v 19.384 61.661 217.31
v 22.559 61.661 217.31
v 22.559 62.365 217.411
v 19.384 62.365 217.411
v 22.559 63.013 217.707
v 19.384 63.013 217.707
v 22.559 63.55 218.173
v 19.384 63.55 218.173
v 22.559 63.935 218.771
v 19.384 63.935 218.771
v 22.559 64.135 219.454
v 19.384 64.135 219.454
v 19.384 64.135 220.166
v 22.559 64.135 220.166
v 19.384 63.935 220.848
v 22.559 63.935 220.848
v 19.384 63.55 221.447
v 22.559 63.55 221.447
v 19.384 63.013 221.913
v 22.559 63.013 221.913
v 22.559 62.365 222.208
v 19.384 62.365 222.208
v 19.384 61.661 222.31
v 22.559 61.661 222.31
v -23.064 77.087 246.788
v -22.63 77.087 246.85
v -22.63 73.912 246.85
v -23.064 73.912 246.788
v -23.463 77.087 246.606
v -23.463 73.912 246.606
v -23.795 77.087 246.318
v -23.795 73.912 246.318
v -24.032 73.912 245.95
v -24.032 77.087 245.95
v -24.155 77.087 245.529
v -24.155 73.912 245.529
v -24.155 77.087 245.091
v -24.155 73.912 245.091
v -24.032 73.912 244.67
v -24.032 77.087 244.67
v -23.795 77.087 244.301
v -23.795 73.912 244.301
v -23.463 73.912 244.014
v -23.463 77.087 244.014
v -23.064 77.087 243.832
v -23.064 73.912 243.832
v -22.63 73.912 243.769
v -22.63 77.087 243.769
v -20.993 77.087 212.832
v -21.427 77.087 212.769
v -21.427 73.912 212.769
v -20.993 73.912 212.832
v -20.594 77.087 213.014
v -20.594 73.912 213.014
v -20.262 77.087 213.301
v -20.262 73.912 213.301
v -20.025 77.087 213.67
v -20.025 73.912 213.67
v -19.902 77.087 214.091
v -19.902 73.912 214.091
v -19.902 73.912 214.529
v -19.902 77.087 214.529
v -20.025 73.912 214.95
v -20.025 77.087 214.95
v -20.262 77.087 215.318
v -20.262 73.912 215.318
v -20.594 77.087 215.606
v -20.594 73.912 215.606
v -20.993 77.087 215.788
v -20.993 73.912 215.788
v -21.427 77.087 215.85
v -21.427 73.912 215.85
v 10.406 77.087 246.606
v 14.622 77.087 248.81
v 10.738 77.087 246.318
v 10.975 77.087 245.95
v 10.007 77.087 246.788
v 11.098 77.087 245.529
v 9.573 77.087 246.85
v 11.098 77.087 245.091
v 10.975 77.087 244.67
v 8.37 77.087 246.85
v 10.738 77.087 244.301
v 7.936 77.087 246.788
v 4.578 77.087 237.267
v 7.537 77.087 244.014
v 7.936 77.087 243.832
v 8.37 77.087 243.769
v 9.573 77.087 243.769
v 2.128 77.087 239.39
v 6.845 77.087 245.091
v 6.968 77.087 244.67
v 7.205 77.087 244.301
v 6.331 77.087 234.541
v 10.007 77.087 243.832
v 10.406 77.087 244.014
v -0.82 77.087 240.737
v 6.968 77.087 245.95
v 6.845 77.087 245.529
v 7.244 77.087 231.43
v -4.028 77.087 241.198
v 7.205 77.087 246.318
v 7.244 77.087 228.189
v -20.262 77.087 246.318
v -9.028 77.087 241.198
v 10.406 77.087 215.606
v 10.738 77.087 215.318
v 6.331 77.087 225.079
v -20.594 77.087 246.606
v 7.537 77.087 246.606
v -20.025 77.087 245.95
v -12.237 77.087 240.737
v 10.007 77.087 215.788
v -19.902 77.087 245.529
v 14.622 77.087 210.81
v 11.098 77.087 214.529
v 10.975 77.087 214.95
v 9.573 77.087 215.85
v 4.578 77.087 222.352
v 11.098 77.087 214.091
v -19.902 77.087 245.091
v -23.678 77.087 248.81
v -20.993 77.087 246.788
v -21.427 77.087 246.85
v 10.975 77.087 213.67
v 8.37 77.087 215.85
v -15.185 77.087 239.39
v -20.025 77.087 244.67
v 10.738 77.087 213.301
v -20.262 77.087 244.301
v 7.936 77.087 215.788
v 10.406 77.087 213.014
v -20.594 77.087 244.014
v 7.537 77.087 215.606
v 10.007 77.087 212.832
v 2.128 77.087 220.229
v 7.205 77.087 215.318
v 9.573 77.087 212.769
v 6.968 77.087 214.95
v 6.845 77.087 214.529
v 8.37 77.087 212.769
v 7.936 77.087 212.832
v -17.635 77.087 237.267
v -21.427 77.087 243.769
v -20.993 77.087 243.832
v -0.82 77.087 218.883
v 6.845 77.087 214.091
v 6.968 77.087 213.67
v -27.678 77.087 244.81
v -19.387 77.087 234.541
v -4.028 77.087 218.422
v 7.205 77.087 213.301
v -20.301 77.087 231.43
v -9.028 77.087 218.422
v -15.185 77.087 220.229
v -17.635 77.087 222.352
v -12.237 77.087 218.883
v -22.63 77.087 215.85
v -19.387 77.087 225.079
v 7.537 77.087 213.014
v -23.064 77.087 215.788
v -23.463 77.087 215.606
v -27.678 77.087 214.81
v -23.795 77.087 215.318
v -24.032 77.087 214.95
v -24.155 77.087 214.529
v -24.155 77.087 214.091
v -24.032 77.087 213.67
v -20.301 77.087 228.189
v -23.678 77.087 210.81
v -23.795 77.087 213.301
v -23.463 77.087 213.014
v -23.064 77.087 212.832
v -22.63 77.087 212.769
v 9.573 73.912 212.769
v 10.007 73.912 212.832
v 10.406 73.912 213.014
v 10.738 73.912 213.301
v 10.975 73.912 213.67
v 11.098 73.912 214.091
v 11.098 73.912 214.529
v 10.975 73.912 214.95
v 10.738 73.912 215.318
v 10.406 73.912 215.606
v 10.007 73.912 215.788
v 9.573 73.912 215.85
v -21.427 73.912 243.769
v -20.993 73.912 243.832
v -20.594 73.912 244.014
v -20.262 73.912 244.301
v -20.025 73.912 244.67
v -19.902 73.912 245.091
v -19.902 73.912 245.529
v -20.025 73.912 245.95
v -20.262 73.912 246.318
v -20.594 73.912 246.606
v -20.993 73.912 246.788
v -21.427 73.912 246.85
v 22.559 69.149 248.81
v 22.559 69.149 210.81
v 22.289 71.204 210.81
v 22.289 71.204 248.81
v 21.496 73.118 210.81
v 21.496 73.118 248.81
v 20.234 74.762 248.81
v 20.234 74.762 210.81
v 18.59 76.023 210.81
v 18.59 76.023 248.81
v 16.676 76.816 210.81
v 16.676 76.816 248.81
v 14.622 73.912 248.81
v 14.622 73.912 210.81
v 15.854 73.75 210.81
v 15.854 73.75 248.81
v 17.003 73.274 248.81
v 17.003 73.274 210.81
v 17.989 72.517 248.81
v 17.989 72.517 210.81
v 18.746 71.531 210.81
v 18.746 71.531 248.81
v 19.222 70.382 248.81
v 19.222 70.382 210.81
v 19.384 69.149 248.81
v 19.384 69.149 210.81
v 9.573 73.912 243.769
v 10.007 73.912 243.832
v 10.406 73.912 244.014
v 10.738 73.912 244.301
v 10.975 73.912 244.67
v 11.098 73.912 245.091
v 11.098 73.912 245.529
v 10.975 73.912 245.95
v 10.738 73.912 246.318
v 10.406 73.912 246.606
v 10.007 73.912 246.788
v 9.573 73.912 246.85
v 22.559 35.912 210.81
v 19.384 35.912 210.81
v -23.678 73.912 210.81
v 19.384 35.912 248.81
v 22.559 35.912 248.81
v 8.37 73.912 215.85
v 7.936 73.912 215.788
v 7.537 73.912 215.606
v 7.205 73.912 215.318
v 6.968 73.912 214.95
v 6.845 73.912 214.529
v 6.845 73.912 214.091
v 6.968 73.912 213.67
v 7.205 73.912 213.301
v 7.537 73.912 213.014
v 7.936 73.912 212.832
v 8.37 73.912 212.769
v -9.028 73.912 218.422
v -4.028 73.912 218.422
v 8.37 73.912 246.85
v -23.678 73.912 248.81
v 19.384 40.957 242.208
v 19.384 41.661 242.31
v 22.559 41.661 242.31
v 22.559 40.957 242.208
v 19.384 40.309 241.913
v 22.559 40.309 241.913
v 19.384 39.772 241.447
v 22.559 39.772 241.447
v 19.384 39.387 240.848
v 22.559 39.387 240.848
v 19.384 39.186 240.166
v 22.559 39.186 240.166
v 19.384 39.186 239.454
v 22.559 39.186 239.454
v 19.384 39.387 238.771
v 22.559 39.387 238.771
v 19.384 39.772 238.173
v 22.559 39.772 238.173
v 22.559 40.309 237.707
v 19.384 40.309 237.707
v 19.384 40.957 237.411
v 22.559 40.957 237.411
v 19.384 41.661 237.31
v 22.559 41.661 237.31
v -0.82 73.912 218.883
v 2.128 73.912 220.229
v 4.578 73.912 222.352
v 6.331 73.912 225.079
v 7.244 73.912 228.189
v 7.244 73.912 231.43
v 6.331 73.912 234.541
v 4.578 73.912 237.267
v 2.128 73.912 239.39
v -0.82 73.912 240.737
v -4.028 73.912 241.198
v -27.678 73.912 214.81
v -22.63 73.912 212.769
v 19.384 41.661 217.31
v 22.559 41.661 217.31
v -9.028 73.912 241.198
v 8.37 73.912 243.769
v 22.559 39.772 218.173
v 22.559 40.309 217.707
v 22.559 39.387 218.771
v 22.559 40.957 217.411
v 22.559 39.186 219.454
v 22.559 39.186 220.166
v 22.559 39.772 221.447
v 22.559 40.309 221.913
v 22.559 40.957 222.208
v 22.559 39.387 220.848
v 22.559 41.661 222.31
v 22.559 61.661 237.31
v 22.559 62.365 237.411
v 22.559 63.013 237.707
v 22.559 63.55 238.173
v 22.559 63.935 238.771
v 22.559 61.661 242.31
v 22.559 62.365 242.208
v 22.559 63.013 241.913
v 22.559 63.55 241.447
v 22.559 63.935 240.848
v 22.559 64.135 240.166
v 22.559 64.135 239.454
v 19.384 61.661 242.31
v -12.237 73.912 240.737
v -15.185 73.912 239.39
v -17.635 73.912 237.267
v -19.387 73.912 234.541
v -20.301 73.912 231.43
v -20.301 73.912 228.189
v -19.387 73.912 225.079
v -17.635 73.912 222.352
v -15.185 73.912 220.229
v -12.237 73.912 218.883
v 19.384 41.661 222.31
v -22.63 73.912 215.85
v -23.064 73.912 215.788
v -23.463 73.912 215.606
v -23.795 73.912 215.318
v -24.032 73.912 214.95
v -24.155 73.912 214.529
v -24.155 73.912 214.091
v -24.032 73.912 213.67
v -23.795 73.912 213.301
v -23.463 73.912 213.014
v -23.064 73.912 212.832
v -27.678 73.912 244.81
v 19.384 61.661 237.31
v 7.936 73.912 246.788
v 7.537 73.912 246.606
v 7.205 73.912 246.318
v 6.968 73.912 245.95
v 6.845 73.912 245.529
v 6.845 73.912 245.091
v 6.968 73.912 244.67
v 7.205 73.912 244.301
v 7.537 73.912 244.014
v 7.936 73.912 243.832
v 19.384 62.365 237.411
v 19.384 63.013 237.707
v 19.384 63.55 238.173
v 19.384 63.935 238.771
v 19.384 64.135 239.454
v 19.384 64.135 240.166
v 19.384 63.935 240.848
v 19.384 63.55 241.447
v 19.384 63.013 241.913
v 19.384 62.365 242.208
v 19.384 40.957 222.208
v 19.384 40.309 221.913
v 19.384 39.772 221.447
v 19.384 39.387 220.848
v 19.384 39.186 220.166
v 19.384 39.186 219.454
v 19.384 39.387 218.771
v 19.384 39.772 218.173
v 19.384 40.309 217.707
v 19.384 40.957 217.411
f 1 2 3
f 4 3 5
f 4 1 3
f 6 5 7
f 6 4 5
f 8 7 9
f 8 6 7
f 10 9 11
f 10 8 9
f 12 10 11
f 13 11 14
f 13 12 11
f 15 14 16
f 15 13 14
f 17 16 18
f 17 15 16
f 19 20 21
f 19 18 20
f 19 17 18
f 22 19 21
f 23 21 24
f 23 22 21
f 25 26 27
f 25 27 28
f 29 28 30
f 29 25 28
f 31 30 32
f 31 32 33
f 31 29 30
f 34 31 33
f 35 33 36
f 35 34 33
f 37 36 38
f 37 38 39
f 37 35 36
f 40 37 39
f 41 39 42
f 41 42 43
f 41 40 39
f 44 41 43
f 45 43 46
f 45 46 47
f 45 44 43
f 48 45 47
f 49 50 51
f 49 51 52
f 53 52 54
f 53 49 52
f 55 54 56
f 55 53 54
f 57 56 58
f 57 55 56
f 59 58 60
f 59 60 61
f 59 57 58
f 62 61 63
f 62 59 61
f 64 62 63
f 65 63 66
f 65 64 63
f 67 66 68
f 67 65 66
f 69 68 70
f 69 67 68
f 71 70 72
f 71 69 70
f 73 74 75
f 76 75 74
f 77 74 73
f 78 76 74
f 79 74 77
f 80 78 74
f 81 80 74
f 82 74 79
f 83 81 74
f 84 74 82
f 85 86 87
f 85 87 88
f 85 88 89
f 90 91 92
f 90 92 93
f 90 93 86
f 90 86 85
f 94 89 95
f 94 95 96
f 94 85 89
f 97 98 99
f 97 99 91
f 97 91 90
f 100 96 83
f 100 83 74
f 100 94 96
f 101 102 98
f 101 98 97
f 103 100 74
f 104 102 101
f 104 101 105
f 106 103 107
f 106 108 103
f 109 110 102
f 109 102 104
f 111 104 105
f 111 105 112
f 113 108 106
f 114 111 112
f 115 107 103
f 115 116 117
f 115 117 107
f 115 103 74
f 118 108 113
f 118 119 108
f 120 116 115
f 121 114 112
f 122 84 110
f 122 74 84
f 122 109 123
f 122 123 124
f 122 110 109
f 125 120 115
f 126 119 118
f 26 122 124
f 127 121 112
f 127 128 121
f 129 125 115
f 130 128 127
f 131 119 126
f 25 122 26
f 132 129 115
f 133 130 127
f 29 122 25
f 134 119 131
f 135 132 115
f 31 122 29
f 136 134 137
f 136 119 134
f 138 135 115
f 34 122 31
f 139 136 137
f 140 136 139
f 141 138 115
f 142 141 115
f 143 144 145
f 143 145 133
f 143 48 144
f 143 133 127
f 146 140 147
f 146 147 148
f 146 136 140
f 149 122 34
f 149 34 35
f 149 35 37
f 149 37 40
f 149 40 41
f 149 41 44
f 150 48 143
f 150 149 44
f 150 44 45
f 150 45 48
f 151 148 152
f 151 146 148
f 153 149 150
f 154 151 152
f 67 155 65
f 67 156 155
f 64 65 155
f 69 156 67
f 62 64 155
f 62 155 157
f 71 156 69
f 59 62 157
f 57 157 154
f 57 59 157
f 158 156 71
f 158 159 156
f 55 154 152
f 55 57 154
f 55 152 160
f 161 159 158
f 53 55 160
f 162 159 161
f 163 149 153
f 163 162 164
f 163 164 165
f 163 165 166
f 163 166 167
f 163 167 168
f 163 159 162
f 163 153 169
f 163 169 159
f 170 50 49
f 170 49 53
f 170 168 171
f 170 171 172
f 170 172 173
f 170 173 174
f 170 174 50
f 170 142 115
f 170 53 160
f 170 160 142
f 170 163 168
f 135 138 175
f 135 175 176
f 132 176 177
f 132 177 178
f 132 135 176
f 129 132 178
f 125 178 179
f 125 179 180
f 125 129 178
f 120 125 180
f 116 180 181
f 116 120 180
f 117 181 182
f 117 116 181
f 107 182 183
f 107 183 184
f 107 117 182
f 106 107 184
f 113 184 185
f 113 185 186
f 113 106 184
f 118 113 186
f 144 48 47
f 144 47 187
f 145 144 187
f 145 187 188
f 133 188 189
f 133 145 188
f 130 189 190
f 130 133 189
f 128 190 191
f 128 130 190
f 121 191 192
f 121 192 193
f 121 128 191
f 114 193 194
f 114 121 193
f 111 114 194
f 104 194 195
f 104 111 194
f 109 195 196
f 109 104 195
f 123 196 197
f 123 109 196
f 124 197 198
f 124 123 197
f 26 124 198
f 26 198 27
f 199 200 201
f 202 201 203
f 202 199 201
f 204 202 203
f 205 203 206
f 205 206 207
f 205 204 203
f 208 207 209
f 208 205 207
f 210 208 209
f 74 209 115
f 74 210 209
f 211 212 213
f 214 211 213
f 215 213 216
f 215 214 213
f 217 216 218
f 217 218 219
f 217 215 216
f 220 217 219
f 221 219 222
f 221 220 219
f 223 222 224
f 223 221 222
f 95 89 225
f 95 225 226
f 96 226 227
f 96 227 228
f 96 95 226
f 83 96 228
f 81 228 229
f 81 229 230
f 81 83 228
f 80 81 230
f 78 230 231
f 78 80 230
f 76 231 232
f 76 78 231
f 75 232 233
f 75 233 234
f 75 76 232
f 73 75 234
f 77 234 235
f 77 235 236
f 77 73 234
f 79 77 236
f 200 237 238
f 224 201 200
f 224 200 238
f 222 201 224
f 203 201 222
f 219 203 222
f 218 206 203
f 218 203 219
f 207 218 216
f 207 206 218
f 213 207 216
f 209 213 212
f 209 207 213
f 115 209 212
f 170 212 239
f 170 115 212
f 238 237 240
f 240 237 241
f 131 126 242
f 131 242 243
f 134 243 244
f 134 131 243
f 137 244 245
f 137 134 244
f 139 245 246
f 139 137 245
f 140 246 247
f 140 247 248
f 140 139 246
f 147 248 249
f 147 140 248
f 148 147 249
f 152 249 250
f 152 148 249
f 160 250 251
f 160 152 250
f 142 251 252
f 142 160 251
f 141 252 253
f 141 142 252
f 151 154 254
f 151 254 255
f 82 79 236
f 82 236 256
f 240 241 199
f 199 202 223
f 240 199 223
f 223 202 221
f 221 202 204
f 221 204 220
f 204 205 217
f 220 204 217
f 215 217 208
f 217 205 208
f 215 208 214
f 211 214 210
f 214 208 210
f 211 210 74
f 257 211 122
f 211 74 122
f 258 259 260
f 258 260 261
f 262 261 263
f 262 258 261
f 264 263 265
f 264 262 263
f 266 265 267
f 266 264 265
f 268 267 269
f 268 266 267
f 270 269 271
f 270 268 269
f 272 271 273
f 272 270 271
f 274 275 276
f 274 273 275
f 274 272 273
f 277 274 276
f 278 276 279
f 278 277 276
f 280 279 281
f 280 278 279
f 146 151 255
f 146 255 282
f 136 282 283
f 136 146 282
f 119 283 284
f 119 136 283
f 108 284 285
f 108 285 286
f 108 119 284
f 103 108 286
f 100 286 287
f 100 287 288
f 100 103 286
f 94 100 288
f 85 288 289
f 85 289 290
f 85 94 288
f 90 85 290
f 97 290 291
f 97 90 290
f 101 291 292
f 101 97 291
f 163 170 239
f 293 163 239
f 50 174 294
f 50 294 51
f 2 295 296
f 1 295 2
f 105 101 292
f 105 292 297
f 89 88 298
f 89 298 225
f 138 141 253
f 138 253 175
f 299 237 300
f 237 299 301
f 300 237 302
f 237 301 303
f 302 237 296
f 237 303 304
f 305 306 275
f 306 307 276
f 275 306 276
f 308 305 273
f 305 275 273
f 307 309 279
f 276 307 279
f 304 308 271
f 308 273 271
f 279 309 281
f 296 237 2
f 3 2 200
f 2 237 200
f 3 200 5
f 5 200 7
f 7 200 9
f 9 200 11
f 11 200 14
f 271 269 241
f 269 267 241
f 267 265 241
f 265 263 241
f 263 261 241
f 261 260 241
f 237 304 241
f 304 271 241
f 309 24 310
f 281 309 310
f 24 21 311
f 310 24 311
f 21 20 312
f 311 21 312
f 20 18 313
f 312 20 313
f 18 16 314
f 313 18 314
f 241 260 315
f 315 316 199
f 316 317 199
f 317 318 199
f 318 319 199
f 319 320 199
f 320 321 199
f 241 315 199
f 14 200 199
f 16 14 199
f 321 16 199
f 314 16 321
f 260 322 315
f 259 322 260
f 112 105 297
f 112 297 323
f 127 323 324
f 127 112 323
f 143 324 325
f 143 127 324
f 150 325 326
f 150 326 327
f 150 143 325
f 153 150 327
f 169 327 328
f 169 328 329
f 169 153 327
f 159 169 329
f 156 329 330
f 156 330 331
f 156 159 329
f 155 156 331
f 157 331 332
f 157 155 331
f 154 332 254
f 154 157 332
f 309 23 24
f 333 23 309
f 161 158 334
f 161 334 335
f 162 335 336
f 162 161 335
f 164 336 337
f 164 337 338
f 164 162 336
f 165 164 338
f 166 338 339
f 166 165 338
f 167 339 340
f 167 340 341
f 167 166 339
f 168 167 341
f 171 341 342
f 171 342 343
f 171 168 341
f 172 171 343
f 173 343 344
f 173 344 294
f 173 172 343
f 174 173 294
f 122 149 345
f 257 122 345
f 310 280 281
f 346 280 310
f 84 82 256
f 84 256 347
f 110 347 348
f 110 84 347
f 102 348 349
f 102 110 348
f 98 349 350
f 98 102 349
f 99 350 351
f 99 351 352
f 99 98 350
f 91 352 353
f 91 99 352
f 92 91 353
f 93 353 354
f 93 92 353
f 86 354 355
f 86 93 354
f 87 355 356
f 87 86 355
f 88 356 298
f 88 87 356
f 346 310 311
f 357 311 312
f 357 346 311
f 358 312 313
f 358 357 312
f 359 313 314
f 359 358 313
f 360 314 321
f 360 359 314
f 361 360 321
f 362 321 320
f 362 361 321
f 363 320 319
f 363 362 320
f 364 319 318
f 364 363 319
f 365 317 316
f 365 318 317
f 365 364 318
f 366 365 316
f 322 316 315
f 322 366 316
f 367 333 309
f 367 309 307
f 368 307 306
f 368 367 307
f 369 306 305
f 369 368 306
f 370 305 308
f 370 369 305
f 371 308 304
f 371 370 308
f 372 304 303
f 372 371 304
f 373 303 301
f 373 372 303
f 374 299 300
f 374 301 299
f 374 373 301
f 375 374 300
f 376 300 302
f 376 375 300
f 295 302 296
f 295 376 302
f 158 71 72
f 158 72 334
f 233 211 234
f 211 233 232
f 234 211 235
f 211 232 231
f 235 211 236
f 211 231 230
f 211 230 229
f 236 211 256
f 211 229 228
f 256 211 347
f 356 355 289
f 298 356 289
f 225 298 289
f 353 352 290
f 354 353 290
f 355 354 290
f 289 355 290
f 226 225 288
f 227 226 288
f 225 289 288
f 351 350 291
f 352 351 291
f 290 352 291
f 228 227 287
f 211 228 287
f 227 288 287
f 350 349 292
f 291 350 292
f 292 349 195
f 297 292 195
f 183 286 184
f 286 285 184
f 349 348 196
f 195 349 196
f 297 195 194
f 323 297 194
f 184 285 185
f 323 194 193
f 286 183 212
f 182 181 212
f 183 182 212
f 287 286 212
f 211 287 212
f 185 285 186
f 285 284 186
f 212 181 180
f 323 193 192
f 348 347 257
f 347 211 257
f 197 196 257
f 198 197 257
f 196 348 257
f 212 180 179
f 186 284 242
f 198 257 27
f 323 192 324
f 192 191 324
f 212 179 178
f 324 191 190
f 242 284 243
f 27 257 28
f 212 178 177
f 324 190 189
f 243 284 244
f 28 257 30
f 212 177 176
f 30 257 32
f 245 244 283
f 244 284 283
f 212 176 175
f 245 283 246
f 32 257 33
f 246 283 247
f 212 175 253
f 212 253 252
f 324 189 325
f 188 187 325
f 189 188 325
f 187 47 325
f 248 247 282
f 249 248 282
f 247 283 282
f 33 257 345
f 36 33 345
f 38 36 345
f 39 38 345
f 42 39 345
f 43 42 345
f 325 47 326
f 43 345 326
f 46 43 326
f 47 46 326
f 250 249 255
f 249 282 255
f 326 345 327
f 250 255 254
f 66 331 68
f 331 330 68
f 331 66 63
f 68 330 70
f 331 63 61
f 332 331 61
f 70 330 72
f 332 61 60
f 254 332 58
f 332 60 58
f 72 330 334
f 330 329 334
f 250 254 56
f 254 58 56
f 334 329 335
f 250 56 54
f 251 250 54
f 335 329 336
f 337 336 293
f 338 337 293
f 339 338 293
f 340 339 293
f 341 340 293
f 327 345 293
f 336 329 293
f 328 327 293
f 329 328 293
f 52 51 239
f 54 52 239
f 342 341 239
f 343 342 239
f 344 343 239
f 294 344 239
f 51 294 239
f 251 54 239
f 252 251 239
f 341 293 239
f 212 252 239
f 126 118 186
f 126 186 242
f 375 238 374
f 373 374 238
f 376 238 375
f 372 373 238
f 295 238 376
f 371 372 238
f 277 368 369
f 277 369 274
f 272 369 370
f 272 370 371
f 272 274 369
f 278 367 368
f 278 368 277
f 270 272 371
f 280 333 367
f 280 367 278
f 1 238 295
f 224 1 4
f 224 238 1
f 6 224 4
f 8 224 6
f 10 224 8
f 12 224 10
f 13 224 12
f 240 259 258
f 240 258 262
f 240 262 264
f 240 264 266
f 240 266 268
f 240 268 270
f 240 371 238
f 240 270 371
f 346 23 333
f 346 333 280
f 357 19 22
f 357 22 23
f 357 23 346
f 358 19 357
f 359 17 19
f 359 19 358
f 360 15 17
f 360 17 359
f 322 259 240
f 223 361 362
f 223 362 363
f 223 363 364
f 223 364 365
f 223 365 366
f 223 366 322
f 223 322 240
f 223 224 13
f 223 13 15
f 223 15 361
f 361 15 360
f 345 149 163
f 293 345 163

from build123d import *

# Parameters (mm, degrees)
SKETCH1_W                    = 38
SKETCH1_H                    = 38
BASE_FLANGE1_DEPTH           = 3.175
EDGE_FLANGE1_STRIP_W         = 22.225
EDGE_FLANGE1_STRIP_H         = 3.175
EDGE_FLANGE1_STRIP_CUT_DEPTH = 38
EDGE_FLANGE1_DEPTH           = 38
EDGE_FLANGE1_START           = 3.175
EDGE_FLANGE1_PROFILE_W       = 38
EDGE_FLANGE1_PROFILE_H       = 42.3
EDGE_FLANGE1_FLAT_DEPTH      = 3.175
CHAMFER1_SIZE                = 4
CUT_EXTRUDE1_DEPTH           = 10


# Sheet-metal steps are written as plain solids
with BuildPart() as part:
    # Sketch1 → Base-Flange1 (new body)
    with BuildSketch(Plane.ZY.offset(-22.559027455)):
        with Locations((229.809714632, 54.911820509)):
            Rectangle(SKETCH1_W, SKETCH1_H)
    extrude(amount=BASE_FLANGE1_DEPTH)

    # Edge-Flange1 strip (across the edge) → Edge-Flange1 strip cut (cut)
    with BuildSketch(Plane(origin=(19.384027455, 73.911820509, 248.809714632), x_dir=(0, -1, 0), z_dir=(0, 0, -1))):
        with Locations((-6.35, -1.5875)):
            Rectangle(EDGE_FLANGE1_STRIP_W, EDGE_FLANGE1_STRIP_H)
    extrude(amount=EDGE_FLANGE1_STRIP_CUT_DEPTH, mode=Mode.SUBTRACT)

    # Edge-Flange1 bend section (across the edge) → Edge-Flange1 (add)
    with BuildSketch(Plane(origin=(19.384027455, 73.911820509, 248.809714632), x_dir=(0, -1, 0), z_dir=(0, 0, -1))):
        with BuildLine():
            Line((-3.175, 4.7625), (0, 4.7625))
            ThreePointArc((0, 4.7625), (1.394903955, 1.394903955), (4.7625, 0))
            Line((4.7625, 0), (4.7625, -3.175))
            ThreePointArc((4.7625, -3.175), (-0.850160076, -0.850160076), (-3.175, 4.7625))
        make_face()
    extrude(amount=EDGE_FLANGE1_DEPTH)

    # Edge-Flange1 profile (on flange) → Edge-Flange1 flat (add)
    with BuildSketch(Plane(origin=(19.384027455, 73.911820509, 0), x_dir=(0, 0, -1), z_dir=(0, 1, 0)).offset(EDGE_FLANGE1_START)):
        with Locations((-229.809714632, 25.9125)):
            Rectangle(EDGE_FLANGE1_PROFILE_W, EDGE_FLANGE1_PROFILE_H)
        with BuildLine():
            Line((-246.850058636, 9.810559352), (-246.850058636, 11.014440648))
            ThreePointArc((-246.850058636, 11.014440648), (-245.309714632, 12.554784652), (-243.769370628, 11.014440648))
            Line((-243.769370628, 11.014440648), (-243.769370628, 9.810559352))
            ThreePointArc((-243.769370628, 9.810559352), (-245.309714632, 8.270215348), (-246.850058636, 9.810559352))
        make_face(mode=Mode.SUBTRACT)
        with BuildLine():
            Line((-215.850058636, 9.810559352), (-215.850058636, 11.014440648))
            ThreePointArc((-215.850058636, 11.014440648), (-214.309714632, 12.554784652), (-212.769370628, 11.014440648))
            Line((-212.769370628, 11.014440648), (-212.769370628, 9.810559352))
            ThreePointArc((-212.769370628, 9.810559352), (-214.309714632, 8.270215348), (-215.850058636, 9.810559352))
        make_face(mode=Mode.SUBTRACT)
        with BuildLine():
            Line((-241.197832947, 23.4125), (-241.197832947, 28.4125))
            ThreePointArc((-241.197832947, 28.4125), (-229.809714632, 39.800618315), (-218.421596317, 28.4125))
            Line((-218.421596317, 28.4125), (-218.421596317, 23.4125))
            ThreePointArc((-218.421596317, 23.4125), (-229.809714632, 12.024381685), (-241.197832947, 23.4125))
        make_face(mode=Mode.SUBTRACT)
        with BuildLine():
            Line((-246.850058636, 40.810559352), (-246.850058636, 42.014440648))
            ThreePointArc((-246.850058636, 42.014440648), (-245.309714632, 43.554784652), (-243.769370628, 42.014440648))
            Line((-243.769370628, 42.014440648), (-243.769370628, 40.810559352))
            ThreePointArc((-243.769370628, 40.810559352), (-245.309714632, 39.270215348), (-246.850058636, 40.810559352))
        make_face(mode=Mode.SUBTRACT)
        with BuildLine():
            Line((-215.850058636, 40.810559352), (-215.850058636, 42.014440648))
            ThreePointArc((-215.850058636, 42.014440648), (-214.309714632, 43.554784652), (-212.769370628, 42.014440648))
            Line((-212.769370628, 42.014440648), (-212.769370628, 40.810559352))
            ThreePointArc((-212.769370628, 40.810559352), (-214.309714632, 39.270215348), (-215.850058636, 40.810559352))
        make_face(mode=Mode.SUBTRACT)
    extrude(amount=-EDGE_FLANGE1_FLAT_DEPTH)

    # Chamfer1
    chamfer1_edges = [part.edges().sort_by_distance(p)[0] for p in [
        (-27.678472545, 75.499320509, 248.809714632),
        (-27.678472545, 75.499320509, 210.809714632),
    ]]
    chamfer(chamfer1_edges, length=CHAMFER1_SIZE)

    # Sketch9 → Cut-Extrude1 (cut)
    with BuildSketch(Plane.ZY.offset(-19.384027455)):
        with BuildLine():
            Line((242.309714632, 61.660898278), (242.309714632, 41.660898278))
            ThreePointArc((242.309714632, 41.660898278), (239.809714632, 39.160898278), (237.309714632, 41.660898278))
            Line((237.309714632, 41.660898278), (237.309714632, 61.660898278))
            ThreePointArc((237.309714632, 61.660898278), (239.809714632, 64.160898278), (242.309714632, 61.660898278))
        make_face()
        with BuildLine():
            Line((222.309714633, 61.660898278), (222.309714633, 41.660898278))
            ThreePointArc((222.309714633, 41.660898278), (219.809714633, 39.160898278), (217.309714633, 41.660898278))
            Line((217.309714633, 41.660898278), (217.309714633, 61.660898278))
            ThreePointArc((217.309714633, 61.660898278), (219.809714633, 64.160898278), (222.309714633, 61.660898278))
        make_face()
    extrude(amount=-CUT_EXTRUDE1_DEPTH, mode=Mode.SUBTRACT)


solid = part.part
